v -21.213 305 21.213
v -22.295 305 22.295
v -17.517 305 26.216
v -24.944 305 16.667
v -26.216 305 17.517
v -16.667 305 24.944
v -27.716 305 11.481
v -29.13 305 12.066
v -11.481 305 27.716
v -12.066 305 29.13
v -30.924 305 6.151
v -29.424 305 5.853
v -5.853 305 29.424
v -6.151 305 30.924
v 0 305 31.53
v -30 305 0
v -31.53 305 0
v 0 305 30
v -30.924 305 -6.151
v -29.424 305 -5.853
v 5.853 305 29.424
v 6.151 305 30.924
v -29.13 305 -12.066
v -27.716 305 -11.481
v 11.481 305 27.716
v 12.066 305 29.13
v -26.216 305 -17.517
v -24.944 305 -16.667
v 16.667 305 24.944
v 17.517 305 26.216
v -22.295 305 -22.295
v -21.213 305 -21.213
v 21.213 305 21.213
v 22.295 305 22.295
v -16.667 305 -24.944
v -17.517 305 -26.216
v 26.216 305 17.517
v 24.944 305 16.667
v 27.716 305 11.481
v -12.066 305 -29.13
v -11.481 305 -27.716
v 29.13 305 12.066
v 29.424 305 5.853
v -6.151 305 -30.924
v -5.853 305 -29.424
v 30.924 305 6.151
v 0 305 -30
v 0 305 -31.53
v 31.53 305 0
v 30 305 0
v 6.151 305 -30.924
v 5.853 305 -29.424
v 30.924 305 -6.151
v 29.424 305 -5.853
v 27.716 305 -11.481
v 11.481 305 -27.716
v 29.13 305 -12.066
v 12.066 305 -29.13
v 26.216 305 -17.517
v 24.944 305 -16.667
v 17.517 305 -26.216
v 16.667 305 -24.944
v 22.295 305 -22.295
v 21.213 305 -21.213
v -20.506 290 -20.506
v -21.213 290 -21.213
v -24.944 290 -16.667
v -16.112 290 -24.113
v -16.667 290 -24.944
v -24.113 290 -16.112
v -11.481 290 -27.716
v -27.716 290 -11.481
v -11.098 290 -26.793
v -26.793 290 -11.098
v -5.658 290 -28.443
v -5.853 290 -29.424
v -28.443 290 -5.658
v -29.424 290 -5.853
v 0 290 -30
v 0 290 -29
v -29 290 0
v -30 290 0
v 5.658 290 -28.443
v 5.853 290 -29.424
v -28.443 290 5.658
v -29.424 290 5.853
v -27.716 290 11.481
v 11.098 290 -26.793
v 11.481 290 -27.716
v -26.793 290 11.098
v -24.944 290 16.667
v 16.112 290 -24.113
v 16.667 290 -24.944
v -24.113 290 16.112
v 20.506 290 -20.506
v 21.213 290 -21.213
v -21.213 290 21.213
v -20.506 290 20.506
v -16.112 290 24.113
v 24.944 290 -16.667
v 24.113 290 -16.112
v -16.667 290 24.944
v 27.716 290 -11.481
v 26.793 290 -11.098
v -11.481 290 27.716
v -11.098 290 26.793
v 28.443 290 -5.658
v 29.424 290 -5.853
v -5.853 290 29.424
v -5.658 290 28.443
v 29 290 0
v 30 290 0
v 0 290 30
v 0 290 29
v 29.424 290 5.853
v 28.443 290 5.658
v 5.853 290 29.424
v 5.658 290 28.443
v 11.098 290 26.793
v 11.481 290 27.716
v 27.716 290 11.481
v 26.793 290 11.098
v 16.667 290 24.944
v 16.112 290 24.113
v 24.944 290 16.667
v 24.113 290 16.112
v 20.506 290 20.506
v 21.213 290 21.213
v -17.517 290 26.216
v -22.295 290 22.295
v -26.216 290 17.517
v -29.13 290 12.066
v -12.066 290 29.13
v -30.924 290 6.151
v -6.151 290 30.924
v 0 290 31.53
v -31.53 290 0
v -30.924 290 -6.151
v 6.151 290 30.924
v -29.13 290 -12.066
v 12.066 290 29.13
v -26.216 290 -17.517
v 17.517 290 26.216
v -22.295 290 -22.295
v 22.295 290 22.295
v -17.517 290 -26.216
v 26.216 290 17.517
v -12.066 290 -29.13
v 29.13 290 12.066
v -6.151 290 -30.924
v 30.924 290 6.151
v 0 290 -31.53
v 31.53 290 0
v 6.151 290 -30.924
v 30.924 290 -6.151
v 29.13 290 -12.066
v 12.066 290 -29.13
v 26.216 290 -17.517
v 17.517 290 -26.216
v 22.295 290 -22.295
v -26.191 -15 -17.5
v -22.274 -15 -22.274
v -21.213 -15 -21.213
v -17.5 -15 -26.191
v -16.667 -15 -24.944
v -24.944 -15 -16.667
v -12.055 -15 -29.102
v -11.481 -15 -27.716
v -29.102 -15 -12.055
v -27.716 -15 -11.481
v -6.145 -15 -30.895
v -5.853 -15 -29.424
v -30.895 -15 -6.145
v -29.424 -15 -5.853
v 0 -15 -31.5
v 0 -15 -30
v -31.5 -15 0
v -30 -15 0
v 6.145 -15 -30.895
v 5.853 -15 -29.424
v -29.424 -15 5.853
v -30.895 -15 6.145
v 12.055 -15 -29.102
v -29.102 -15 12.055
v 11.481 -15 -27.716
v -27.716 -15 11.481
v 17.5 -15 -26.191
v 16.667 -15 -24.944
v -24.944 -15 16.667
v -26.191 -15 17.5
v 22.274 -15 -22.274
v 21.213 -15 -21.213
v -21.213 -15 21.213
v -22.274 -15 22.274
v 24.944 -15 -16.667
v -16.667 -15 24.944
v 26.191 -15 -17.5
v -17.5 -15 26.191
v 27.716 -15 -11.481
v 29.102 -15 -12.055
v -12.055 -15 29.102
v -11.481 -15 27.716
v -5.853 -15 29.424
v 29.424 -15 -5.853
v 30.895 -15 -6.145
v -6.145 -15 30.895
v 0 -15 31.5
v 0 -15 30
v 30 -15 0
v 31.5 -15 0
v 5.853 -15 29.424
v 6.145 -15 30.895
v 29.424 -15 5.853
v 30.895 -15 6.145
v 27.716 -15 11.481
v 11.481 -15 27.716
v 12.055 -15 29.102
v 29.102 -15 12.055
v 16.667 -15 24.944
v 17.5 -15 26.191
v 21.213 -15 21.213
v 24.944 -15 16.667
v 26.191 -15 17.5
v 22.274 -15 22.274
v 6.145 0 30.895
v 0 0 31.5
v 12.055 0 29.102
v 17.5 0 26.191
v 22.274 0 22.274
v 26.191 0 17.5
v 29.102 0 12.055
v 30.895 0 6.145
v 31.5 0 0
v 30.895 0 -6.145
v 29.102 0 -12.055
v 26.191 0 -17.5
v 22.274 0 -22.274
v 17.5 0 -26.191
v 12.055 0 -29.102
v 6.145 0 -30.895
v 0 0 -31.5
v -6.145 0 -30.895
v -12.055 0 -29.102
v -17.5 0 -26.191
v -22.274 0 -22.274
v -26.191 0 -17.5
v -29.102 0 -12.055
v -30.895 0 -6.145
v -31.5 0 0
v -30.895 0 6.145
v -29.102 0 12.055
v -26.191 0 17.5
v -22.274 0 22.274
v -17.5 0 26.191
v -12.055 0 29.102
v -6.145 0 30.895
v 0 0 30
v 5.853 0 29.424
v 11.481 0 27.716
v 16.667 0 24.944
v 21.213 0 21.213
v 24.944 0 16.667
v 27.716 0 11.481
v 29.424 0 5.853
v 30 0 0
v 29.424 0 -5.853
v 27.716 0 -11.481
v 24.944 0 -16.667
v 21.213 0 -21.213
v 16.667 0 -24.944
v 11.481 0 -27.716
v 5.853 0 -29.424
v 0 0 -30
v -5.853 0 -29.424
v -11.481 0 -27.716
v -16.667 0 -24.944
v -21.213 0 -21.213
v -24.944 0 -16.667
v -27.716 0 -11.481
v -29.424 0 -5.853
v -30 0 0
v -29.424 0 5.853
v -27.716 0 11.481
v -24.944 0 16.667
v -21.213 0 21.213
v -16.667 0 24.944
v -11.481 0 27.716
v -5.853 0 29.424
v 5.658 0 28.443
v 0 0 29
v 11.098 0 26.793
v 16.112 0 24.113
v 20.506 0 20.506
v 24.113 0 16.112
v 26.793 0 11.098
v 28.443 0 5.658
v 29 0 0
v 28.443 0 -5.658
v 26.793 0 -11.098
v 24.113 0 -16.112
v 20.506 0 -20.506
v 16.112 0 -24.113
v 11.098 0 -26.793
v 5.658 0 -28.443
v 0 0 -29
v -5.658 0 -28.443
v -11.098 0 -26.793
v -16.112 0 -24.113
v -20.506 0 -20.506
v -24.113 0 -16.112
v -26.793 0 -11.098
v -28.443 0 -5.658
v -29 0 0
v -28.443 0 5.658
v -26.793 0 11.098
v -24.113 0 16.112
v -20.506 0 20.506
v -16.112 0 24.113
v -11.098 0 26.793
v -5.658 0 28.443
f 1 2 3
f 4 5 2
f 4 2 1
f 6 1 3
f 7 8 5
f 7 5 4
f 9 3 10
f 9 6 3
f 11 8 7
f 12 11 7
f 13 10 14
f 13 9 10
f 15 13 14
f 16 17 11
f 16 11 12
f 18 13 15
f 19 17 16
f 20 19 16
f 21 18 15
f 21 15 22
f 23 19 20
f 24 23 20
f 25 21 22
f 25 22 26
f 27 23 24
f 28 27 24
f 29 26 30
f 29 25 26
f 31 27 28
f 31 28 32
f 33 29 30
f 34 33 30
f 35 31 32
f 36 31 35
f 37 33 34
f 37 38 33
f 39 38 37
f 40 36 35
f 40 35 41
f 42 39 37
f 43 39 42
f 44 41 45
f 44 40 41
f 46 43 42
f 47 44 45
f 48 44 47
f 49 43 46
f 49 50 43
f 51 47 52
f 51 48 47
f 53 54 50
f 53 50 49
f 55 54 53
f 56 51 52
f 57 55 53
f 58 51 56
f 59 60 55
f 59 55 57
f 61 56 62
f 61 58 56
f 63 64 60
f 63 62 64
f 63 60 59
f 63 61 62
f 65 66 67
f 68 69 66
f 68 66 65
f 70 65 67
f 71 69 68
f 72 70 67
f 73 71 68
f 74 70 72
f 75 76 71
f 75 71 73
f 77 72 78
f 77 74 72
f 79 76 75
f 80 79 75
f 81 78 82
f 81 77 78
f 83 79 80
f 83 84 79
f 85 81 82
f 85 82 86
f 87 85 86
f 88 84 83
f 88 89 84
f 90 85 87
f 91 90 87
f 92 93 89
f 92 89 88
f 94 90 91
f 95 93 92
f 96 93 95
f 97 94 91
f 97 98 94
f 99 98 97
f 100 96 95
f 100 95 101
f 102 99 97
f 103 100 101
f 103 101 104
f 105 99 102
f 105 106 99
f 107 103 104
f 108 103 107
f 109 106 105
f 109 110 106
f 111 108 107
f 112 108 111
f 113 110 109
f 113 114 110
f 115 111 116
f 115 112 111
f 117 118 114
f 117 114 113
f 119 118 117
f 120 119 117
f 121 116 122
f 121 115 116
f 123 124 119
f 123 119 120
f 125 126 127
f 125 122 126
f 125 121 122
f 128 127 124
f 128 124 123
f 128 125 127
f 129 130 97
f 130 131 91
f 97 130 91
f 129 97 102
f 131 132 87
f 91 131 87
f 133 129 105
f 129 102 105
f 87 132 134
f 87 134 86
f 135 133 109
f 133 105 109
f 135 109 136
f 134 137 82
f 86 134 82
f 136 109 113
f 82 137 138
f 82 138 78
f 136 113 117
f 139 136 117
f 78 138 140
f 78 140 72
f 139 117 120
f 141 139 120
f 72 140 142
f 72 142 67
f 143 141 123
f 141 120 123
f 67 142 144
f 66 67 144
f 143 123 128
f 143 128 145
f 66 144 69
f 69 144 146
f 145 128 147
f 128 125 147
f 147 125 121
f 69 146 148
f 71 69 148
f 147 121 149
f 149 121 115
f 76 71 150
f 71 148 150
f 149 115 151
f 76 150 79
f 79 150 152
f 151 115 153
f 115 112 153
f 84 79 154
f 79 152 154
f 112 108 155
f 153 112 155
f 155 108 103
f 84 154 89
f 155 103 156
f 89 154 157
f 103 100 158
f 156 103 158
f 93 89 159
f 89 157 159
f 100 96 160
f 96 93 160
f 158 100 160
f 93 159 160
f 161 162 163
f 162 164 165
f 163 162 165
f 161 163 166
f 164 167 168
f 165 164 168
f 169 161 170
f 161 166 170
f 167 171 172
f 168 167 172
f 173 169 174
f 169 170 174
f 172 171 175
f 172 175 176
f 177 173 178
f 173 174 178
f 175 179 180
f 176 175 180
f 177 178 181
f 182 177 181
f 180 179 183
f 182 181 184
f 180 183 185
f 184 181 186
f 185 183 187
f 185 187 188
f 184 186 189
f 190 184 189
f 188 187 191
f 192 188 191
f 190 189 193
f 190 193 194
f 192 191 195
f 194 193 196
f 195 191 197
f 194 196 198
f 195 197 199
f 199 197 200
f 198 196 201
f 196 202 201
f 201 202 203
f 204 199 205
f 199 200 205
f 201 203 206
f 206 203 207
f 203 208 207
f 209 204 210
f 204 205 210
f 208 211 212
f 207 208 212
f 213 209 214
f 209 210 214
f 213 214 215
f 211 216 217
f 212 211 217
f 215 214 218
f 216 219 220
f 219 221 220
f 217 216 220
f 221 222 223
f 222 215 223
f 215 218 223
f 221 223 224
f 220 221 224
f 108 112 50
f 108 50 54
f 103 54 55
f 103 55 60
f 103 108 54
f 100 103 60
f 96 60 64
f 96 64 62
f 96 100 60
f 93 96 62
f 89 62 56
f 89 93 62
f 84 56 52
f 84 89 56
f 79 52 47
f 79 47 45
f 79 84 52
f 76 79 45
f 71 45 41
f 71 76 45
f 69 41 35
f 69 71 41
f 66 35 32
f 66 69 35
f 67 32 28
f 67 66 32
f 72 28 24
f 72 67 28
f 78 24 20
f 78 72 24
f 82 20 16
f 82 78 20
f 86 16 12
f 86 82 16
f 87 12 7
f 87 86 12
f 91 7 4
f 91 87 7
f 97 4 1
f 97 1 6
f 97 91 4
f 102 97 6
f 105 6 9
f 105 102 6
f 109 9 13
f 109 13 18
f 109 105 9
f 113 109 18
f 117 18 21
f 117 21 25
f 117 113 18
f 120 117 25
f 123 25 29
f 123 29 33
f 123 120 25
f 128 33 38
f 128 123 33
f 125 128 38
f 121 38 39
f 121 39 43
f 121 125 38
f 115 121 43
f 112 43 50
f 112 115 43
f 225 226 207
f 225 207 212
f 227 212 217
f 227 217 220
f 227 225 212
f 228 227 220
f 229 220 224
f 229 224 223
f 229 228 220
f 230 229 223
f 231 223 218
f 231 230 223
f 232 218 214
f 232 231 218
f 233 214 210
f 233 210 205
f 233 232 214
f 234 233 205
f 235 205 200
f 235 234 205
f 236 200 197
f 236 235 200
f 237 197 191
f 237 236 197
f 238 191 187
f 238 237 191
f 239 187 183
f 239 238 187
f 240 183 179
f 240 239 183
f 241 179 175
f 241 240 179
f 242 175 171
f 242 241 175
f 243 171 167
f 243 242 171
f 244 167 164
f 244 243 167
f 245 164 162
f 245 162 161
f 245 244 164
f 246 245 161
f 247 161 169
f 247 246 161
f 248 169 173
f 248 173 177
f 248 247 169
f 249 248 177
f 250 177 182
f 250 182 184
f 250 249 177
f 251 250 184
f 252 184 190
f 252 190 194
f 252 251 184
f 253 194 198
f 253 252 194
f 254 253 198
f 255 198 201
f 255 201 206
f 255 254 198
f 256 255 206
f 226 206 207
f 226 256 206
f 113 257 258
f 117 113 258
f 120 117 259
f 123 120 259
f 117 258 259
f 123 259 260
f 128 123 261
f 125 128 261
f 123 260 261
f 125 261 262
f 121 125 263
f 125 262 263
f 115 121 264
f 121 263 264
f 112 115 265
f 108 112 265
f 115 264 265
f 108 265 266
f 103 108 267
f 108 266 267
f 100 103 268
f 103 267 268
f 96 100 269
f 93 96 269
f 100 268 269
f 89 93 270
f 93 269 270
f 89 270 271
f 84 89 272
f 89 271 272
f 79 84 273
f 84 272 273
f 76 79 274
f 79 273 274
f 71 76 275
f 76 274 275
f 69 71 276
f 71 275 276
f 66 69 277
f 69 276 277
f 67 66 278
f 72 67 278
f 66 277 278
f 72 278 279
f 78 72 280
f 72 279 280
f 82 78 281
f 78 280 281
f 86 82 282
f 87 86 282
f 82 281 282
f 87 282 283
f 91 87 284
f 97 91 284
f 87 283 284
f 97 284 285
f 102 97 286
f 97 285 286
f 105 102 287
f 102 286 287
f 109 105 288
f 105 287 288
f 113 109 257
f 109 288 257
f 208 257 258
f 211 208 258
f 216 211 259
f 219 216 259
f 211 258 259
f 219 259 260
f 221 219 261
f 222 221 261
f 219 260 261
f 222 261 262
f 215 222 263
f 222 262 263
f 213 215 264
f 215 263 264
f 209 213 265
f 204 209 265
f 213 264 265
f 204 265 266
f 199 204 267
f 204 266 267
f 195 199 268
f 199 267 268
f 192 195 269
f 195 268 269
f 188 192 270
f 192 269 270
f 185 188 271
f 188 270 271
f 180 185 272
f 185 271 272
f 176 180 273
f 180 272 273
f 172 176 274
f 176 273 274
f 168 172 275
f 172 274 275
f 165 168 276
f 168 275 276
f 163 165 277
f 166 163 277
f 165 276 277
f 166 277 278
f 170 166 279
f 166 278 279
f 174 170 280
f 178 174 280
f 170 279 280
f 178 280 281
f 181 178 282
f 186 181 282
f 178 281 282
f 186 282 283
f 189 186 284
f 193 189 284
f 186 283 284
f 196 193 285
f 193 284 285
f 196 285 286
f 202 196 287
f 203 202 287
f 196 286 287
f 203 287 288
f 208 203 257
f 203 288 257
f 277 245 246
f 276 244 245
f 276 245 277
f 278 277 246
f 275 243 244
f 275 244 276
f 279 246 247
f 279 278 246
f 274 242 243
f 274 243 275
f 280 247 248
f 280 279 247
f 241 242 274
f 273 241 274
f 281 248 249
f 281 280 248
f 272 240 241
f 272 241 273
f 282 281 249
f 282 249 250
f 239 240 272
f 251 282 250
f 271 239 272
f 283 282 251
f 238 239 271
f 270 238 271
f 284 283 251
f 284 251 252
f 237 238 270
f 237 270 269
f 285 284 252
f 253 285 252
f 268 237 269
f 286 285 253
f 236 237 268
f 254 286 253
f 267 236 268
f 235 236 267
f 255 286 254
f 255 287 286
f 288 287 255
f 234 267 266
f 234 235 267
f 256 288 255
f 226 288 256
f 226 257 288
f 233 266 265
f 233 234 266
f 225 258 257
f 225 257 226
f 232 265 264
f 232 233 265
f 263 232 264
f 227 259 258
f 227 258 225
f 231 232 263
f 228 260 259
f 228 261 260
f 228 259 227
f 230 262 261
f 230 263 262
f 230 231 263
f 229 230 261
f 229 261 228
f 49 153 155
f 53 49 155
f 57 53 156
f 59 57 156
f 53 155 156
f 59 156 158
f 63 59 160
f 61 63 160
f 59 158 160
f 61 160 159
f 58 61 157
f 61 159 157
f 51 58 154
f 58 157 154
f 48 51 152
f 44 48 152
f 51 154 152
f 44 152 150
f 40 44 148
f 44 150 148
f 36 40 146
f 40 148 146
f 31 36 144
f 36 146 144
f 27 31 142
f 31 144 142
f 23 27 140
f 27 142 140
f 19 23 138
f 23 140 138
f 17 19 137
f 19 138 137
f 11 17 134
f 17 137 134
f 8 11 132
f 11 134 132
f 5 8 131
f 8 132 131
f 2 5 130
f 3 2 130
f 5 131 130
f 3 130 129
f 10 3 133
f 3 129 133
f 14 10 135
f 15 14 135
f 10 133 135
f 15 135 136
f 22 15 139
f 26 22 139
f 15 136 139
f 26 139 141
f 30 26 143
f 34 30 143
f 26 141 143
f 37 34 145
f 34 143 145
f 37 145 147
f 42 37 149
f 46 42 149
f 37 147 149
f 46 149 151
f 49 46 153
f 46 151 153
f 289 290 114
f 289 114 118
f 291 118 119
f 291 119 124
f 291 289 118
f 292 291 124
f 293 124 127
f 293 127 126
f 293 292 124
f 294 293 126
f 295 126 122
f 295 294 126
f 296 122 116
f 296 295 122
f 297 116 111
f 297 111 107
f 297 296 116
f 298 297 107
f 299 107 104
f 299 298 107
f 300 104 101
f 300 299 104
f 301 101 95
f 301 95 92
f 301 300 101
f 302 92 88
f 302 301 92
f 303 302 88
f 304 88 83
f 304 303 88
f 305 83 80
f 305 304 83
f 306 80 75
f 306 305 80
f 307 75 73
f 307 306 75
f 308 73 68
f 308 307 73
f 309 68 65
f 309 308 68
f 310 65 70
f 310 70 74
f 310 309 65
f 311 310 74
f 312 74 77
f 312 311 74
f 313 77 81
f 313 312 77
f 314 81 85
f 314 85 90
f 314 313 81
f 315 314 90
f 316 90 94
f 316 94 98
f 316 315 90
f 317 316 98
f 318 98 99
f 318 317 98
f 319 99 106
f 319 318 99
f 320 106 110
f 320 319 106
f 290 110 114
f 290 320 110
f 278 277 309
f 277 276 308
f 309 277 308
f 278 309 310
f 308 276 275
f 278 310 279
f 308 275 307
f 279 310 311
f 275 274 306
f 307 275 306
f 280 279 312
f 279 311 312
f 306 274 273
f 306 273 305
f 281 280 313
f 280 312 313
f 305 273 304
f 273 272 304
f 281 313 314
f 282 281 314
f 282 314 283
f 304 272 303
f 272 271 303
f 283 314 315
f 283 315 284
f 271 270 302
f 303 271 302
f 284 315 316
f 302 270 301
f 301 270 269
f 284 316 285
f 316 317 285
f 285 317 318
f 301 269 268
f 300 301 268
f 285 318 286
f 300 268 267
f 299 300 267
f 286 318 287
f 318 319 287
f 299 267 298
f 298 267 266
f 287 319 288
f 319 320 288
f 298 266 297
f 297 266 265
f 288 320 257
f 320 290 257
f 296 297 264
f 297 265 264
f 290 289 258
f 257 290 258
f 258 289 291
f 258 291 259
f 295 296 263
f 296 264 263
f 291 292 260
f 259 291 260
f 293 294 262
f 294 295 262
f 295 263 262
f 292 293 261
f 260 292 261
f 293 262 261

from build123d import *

# Parameters (mm, degrees)
SKETCH1_R                 = 30
SKETCH1_R_2               = 29
BOSS_EXTRUDE2_DEPTH       = 290
SKETCH2_R                 = 31.5
SKETCH2_R_2               = 30
BOSS_EXTRUDE3_DEPTH       = 15
BOSS_EXTRUDE4_START       = 290
BOSS_EXTRUDE4_OUTLINE_R   = 31.530256187
BOSS_EXTRUDE4_OUTLINE_R_2 = 30
BOSS_EXTRUDE4_DEPTH       = 15


# Read off the part's stored shape, not the designer's step: Boss-Extrude4
with BuildPart() as part:
    # Sketch1 → Boss-Extrude2 (new body)
    with BuildSketch(Plane(origin=(0, 0, 0), x_dir=(1, 0, 0), z_dir=(0, 1, 0))):
        with Locations(Location((0, 0, 0), (0, 0, 270))):
            Circle(SKETCH1_R)
        with Locations(Location((0, 0, 0), (0, 0, 270))):
            Circle(SKETCH1_R_2, mode=Mode.SUBTRACT)
    extrude(amount=BOSS_EXTRUDE2_DEPTH)


with BuildPart() as body_2:
    # Sketch2 → Boss-Extrude3 (new body)
    with BuildSketch(Plane(origin=(0, 0, 0), x_dir=(1, 0, 0), z_dir=(0, 1, 0))):
        with Locations(Location((0, 0, 0), (0, 0, 270))):
            Circle(SKETCH2_R)
        with Locations(Location((0, 0, 0), (0, 0, 270))):
            Circle(SKETCH2_R_2, mode=Mode.SUBTRACT)
    extrude(amount=-BOSS_EXTRUDE3_DEPTH)


with BuildPart() as body_3:
    # Boss-Extrude4 outline → Boss-Extrude4 (new body)
    with BuildSketch(Plane(origin=(0, 0, 0), x_dir=(1, 0, 0), z_dir=(0, 1, 0)).offset(BOSS_EXTRUDE4_START)):
        Circle(BOSS_EXTRUDE4_OUTLINE_R)
        Circle(BOSS_EXTRUDE4_OUTLINE_R_2, mode=Mode.SUBTRACT)
    extrude(amount=BOSS_EXTRUDE4_DEPTH)


solid = Compound([part.part, body_2.part, body_3.part])
